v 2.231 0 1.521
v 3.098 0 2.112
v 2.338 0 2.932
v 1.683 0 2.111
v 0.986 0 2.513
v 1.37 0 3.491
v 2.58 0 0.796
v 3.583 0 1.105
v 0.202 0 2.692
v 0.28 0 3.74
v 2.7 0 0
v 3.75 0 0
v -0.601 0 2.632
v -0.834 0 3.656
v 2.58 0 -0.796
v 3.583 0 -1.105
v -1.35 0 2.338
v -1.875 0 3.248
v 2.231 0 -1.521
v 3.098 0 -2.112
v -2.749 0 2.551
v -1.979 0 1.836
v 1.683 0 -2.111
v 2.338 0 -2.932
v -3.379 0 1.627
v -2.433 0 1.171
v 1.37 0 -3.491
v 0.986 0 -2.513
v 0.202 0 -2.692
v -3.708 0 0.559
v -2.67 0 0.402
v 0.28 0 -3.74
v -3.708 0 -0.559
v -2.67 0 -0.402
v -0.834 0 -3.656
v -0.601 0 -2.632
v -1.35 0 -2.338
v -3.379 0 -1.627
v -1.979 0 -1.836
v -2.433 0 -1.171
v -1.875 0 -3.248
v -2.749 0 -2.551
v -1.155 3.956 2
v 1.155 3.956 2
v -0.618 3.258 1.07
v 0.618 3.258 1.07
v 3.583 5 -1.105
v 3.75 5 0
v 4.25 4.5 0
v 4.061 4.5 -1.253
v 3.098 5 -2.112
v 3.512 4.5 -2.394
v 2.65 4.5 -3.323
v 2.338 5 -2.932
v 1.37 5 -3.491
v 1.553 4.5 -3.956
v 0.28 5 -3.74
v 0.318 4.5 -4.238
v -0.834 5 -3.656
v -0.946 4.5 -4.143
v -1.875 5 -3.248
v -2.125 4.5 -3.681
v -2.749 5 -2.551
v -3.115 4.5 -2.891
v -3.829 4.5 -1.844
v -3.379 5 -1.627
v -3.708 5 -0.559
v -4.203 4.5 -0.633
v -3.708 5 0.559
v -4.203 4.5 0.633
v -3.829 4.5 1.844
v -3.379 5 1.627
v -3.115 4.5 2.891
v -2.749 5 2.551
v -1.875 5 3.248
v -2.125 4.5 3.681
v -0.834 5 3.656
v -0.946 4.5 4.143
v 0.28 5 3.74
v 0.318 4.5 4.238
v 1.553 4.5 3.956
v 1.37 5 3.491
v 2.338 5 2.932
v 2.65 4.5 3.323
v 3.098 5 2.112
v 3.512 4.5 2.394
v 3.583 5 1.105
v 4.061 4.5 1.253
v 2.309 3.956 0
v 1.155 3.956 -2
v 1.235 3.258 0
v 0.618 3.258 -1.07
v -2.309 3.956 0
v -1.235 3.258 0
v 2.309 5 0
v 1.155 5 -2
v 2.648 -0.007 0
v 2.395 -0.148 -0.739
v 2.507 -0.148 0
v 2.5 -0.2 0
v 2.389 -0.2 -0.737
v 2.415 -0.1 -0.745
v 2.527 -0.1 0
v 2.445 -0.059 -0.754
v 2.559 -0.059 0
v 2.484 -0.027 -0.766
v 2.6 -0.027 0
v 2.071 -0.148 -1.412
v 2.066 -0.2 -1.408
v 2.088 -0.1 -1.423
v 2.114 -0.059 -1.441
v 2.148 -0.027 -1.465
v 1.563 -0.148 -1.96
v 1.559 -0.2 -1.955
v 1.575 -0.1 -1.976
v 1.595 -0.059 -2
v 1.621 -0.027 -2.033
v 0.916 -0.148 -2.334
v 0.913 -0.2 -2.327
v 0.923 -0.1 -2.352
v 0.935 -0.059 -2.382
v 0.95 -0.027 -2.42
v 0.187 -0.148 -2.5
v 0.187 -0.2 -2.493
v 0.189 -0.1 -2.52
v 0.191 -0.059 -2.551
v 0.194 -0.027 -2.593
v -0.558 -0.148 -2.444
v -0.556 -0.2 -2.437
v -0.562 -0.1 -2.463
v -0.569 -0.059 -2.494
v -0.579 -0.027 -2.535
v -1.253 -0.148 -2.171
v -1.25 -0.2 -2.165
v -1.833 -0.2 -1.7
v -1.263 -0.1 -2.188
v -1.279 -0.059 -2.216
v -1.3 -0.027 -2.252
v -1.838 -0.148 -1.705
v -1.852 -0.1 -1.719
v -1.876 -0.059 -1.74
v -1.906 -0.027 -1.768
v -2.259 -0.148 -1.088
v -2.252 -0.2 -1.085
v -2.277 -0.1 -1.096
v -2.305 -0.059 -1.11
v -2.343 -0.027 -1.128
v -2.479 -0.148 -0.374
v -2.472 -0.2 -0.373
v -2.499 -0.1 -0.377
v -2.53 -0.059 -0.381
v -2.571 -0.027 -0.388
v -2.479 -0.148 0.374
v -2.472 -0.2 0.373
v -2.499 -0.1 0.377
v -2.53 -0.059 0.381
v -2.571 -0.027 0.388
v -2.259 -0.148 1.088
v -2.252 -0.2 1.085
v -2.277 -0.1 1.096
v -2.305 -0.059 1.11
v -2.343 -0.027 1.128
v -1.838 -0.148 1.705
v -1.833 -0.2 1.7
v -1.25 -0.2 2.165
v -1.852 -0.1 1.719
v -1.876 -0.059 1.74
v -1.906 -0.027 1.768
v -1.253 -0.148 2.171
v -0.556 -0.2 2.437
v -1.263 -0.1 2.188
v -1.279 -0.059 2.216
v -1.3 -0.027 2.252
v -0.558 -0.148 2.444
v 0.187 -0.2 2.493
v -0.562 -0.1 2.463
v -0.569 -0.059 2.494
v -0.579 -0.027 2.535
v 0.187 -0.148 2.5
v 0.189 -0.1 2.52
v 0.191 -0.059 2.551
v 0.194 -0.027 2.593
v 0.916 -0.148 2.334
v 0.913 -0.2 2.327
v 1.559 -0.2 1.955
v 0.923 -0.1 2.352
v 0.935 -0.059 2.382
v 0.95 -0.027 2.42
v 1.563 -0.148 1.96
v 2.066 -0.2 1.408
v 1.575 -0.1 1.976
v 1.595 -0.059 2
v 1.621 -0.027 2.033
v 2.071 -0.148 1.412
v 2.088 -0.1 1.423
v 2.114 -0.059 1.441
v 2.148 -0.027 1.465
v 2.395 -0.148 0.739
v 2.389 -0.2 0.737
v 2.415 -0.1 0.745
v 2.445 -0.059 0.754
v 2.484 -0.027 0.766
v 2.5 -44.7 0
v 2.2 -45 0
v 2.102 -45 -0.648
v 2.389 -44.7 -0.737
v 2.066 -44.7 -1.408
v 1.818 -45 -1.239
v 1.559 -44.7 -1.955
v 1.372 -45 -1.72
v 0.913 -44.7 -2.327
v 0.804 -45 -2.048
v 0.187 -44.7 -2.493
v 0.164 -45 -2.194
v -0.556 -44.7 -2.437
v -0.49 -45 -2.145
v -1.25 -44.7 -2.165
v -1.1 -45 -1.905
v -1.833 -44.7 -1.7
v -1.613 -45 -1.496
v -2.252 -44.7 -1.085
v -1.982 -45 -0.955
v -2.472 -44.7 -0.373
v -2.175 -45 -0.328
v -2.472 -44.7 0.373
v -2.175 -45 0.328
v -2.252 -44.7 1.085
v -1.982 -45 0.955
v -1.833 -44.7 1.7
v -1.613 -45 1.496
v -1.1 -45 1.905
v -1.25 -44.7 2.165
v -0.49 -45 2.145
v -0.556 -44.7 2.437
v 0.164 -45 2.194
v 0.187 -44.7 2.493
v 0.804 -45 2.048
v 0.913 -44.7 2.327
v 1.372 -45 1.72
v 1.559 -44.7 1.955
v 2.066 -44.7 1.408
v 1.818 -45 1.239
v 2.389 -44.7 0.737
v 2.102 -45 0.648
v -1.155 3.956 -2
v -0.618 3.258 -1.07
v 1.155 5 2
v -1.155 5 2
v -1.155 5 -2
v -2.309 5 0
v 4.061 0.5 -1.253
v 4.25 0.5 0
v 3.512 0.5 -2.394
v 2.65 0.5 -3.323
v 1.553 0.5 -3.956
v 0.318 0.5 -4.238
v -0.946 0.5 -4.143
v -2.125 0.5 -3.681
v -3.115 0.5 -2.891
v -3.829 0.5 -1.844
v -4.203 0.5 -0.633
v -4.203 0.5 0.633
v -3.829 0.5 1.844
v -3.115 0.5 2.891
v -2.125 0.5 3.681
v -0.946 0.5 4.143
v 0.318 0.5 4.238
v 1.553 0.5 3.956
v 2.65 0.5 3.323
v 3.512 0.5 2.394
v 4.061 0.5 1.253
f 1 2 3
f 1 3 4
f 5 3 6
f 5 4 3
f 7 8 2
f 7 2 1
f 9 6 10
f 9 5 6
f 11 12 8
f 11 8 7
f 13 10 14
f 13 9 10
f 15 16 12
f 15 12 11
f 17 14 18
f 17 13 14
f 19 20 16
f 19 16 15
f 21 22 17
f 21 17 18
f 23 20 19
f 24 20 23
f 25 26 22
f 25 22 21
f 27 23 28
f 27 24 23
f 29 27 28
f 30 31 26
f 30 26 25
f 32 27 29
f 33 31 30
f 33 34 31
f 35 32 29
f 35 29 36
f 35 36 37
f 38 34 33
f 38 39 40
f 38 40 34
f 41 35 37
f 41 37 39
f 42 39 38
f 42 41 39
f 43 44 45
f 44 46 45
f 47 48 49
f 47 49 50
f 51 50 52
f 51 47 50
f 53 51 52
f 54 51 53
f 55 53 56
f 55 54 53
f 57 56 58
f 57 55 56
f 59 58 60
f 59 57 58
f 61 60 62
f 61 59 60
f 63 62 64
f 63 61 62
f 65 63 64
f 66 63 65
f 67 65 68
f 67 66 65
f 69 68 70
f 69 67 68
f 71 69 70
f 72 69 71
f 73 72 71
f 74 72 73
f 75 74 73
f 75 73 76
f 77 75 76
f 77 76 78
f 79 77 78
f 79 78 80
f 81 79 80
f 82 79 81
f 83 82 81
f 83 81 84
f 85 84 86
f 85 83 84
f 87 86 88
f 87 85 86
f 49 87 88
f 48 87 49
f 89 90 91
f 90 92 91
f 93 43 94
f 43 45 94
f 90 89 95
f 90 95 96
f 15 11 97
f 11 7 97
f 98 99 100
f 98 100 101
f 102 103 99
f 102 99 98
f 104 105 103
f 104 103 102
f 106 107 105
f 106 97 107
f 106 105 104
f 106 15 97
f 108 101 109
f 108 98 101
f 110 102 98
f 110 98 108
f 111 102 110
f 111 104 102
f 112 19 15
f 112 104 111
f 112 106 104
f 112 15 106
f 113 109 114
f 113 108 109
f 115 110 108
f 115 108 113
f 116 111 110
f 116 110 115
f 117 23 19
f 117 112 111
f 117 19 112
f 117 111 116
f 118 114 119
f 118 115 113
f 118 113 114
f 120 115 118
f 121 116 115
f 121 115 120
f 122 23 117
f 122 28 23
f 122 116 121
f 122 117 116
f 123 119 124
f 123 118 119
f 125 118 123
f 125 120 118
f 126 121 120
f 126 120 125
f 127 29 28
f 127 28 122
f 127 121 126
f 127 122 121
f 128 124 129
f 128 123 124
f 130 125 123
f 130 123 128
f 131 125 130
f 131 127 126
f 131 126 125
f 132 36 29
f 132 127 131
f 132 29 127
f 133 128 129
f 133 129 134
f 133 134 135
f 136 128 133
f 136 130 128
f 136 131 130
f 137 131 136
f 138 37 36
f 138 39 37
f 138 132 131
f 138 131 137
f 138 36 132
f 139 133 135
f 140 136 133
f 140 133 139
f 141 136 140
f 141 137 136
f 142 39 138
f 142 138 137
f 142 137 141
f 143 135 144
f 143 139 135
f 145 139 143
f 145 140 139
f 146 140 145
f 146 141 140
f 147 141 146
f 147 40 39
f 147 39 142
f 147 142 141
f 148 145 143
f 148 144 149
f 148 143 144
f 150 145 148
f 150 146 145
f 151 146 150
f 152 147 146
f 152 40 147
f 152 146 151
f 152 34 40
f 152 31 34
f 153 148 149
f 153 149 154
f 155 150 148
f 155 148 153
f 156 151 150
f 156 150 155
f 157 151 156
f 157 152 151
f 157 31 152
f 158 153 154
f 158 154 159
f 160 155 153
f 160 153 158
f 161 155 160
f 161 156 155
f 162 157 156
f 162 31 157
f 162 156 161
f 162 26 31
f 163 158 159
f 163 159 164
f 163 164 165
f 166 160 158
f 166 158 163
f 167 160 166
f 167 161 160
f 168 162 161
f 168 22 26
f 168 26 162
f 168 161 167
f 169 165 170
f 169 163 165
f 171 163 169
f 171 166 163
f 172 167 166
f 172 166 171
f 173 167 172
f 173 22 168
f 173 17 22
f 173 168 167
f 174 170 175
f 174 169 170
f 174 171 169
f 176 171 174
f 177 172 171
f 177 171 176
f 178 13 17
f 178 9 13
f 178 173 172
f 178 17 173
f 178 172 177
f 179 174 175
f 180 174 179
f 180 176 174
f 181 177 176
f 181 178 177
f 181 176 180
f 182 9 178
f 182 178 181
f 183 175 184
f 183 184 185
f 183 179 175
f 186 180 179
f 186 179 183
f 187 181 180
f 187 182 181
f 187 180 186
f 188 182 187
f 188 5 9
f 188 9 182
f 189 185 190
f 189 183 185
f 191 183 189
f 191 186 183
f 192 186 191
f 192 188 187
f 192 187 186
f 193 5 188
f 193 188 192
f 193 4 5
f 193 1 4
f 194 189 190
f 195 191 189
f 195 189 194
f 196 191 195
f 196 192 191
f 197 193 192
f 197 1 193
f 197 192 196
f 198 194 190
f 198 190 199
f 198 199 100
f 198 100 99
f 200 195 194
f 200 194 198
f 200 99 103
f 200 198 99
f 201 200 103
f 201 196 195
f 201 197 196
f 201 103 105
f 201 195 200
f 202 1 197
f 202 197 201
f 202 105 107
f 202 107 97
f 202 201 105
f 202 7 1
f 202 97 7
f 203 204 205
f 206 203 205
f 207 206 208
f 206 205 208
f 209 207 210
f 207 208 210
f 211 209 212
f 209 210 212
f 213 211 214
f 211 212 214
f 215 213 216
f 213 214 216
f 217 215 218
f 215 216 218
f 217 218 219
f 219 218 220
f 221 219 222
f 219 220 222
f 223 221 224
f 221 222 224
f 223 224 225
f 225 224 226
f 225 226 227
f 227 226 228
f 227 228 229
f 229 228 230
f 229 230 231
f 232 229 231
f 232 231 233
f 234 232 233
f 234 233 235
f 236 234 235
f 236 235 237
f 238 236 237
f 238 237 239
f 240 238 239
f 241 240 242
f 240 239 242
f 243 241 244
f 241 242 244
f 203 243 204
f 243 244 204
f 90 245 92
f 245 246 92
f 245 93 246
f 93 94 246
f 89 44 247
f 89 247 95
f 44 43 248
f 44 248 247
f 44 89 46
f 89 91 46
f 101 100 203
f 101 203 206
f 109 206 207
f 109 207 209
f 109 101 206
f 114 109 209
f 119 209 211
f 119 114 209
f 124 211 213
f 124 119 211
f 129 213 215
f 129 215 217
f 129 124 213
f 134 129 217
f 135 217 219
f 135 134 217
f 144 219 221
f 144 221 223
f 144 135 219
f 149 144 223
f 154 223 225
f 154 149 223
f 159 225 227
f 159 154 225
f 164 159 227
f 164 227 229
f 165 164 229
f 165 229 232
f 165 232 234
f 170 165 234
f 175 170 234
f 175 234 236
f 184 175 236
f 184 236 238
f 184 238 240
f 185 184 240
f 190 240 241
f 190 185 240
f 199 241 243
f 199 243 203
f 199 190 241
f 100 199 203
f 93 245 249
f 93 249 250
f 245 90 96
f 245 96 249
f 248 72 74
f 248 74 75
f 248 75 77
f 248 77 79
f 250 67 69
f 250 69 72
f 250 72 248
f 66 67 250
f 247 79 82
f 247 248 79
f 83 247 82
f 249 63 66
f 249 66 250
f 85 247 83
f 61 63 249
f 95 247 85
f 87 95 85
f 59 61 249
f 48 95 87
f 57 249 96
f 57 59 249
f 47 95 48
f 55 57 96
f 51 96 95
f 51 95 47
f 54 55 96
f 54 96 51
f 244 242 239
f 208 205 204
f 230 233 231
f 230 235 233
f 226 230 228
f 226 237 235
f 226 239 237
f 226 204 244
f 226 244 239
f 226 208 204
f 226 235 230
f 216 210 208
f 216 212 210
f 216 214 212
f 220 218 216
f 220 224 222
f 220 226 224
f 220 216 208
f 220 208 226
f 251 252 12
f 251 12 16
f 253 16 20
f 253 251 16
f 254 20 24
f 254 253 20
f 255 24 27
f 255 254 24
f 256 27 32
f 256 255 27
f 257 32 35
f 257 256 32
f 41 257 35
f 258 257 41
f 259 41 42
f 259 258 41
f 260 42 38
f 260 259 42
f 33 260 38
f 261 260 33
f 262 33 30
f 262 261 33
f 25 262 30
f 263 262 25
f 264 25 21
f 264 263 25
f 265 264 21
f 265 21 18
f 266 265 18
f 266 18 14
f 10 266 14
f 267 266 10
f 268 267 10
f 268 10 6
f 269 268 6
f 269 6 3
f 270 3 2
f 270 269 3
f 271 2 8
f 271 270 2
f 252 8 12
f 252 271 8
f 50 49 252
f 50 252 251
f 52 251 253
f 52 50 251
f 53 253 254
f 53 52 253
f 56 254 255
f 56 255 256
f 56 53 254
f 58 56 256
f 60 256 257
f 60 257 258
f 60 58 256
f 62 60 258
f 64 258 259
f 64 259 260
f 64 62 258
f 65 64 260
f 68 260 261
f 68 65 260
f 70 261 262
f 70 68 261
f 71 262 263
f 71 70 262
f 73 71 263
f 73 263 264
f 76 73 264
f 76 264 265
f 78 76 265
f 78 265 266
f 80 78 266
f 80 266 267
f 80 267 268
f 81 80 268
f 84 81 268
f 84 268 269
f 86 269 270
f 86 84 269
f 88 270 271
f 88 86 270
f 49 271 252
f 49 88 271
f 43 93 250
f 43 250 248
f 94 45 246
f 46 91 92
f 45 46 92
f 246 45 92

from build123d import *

# Parameters (mm, degrees)
REDONDEO1_R          = 0.2
CHAFL_N1_SIZE        = 0.3
CHAFL_N2_SIZE        = 0.5
CORTAR_BARRER1_START = 3.956316317
CORTAR_BARRER1_DEPTH = 1.043683683


with BuildPart() as part:
    # Croquis1 → Revolución1 (revolve)
    with BuildSketch(Plane.XY):
        Polygon((0, 0), (0, -45), (2.5, -45), (2.5, 0), (4.25, 0), (4.25, 5), (0, 5), align=None)
    revolve(axis=Axis((0, -1001.198752701, 0), (0, 1, 0)))

    # Redondeo1
    redondeo1_edges = [part.edges().sort_by_distance(p)[0] for p in [
        (-2.5, 0, 0),
    ]]
    fillet(redondeo1_edges, radius=REDONDEO1_R)

    # Chaflán1
    chafl_n1_edges = [part.edges().sort_by_distance(p)[0] for p in [
        (-2.5, -45, 0),
    ]]
    chamfer(chafl_n1_edges, length=CHAFL_N1_SIZE)

    # Chaflán2
    chafl_n2_edges = [part.edges().sort_by_distance(p)[0] for p in [
        (-4.25, 5, 0),
        (-4.25, 0, 0),
    ]]
    chamfer(chafl_n2_edges, length=CHAFL_N2_SIZE)

    # Cortar-Barrer1: read off the stored shape, not the designer's step
    # Cortar-Barrer1 outline → Cortar-Barrer1 (cut)
    with BuildSketch(Plane(origin=(0, 0, 0), x_dir=(1, 0, 0), z_dir=(0, 1, 0)).offset(CORTAR_BARRER1_START)):
        Polygon((1.154700538, 2), (-1.154700538, 2), (-2.309401077, 0), (-1.154700538, -2), (1.154700538, -2), (2.309401077, 0), align=None)
    extrude(amount=CORTAR_BARRER1_DEPTH, mode=Mode.SUBTRACT)

    # Cortar-Barrer1 2: loft between two sections, ruled curve by curve
    cortar_barrer1_2_from = [
        Edge.make_line((-2.309401077, 3.956316317, 0), (-1.154700538, 3.956316317, -2)),
        Edge.make_line((-1.154700538, 3.956316317, 2), (-2.309401077, 3.956316317, 0)),
        Edge.make_line((-1.154700538, 3.956316317, -2), (1.154700538, 3.956316317, -2)),
        Edge.make_line((1.154700538, 3.956316317, 2), (-1.154700538, 3.956316317, 2)),
        Edge.make_line((1.154700538, 3.956316317, -2), (2.309401077, 3.956316317, 0)),
        Edge.make_line((2.309401077, 3.956316317, 0), (1.154700538, 3.956316317, 2)),
    ]
    cortar_barrer1_2_to = [
        Edge.make_line((-1.235376897, 3.257522104, 0), (-0.617688448, 3.257522104, -1.069867776)),
        Edge.make_line((-0.617688448, 3.257522104, 1.069867776), (-1.235376897, 3.257522104, 0)),
        Edge.make_line((-0.617688448, 3.257522104, -1.069867776), (0.617688448, 3.257522104, -1.069867776)),
        Edge.make_line((0.617688448, 3.257522104, 1.069867776), (-0.617688448, 3.257522104, 1.069867776)),
        Edge.make_line((0.617688448, 3.257522104, -1.069867776), (1.235376897, 3.257522104, 0)),
        Edge.make_line((1.235376897, 3.257522104, 0), (0.617688448, 3.257522104, 1.069867776)),
    ]
    cortar_barrer1_2 = Solid(Shell([*[Face.make_surface_from_curves(cortar_barrer1_2_from[k], cortar_barrer1_2_to[k]) for k in range(6)], Face(Wire(cortar_barrer1_2_from)), Face(Wire(cortar_barrer1_2_to))]))
    add(cortar_barrer1_2, mode=Mode.SUBTRACT)


solid = part.part
